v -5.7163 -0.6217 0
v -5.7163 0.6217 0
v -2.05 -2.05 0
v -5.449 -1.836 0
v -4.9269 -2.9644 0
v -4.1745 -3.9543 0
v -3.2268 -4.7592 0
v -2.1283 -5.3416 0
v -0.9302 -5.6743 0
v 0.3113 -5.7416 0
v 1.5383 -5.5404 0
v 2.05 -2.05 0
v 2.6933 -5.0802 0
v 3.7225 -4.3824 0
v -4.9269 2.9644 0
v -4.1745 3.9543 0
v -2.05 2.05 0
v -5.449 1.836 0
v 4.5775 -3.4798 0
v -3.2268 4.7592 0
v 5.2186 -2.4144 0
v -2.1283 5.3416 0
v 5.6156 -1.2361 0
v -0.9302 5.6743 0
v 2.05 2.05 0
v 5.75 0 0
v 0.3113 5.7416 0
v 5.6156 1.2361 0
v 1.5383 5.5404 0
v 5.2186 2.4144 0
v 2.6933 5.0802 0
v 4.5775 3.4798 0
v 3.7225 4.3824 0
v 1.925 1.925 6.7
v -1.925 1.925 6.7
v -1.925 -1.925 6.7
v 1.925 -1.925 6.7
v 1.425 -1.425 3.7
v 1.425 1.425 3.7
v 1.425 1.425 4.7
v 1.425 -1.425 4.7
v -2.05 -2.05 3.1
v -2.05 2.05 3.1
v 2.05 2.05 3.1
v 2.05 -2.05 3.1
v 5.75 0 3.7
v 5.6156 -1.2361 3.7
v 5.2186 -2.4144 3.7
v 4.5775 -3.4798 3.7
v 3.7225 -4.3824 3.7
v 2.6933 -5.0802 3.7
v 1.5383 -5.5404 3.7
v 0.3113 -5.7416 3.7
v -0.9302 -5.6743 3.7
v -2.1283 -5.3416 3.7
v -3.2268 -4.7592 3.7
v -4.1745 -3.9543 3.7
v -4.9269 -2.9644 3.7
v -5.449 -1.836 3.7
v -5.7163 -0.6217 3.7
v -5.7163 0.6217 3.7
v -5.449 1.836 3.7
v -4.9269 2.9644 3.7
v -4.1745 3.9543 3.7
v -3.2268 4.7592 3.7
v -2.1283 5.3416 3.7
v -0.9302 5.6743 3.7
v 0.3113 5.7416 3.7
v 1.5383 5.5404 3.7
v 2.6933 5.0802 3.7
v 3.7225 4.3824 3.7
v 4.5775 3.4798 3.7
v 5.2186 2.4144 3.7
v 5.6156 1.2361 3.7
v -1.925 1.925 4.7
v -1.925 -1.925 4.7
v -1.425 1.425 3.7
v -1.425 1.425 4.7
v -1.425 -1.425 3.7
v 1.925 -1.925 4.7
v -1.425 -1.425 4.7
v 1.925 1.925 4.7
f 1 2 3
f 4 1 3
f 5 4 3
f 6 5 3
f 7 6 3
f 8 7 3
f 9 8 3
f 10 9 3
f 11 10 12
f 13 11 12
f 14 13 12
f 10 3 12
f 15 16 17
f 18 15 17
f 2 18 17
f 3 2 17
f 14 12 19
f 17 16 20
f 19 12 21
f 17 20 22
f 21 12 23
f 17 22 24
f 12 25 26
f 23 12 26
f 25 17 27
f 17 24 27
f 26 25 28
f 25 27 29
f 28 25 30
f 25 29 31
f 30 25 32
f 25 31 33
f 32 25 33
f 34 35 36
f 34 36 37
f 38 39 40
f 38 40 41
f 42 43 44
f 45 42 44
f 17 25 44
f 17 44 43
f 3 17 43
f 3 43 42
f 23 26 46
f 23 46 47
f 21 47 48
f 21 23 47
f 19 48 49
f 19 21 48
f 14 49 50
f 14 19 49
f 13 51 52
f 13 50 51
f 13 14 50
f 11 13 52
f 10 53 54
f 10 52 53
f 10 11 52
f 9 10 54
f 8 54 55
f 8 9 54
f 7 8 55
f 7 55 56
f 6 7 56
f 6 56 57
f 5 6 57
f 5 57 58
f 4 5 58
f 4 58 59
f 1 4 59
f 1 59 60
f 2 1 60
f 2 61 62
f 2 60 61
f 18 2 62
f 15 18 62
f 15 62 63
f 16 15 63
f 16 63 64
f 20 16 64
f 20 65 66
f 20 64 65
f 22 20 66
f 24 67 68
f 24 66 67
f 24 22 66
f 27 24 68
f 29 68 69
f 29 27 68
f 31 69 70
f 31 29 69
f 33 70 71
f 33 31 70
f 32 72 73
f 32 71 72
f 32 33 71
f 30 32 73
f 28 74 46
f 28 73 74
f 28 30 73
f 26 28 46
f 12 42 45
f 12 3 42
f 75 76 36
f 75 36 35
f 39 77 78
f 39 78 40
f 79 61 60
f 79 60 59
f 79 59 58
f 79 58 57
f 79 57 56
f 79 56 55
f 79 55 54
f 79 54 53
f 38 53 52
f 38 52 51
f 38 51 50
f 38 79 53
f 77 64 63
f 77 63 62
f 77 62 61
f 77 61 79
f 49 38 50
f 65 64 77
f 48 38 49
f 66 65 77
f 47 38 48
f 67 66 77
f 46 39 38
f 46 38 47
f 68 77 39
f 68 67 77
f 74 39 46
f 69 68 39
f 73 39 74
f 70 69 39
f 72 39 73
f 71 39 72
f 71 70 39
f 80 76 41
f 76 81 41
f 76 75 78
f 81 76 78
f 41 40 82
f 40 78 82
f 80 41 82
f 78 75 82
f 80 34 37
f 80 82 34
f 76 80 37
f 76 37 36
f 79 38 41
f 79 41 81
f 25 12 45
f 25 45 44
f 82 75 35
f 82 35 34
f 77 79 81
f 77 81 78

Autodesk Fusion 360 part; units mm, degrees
sketch "Sketch1" plane through (0, 0, 0) normal (0, 0, 1) x (1, 0, 0)
  circle A0 centre (0, 0) radius 5.75
  line L0 (1.925, -1.925) -> (-1.925, -1.925)
  line L1 (-1.925, -1.925) -> (-1.925, 1.925)
  line L2 (-1.925, 1.925) -> (1.925, 1.925)
  line L3 (1.925, 1.925) -> (1.925, -1.925)
  line L4 (1.925, -1.925) -> (-1.925, 1.925) construction
  line L5 (-1.925, -1.925) -> (1.925, 1.925) construction
  line L6 (-1.425, 1.425) -> (1.425, 1.425)
  line L7 (1.425, 1.425) -> (1.425, -1.425)
  line L8 (1.425, -1.425) -> (-1.425, -1.425)
  line L9 (-1.425, -1.425) -> (-1.425, 1.425)
  line L10 (-2.05, -2.05) -> (2.05, -2.05)
  line L11 (2.05, -2.05) -> (2.05, 2.05)
  line L12 (2.05, 2.05) -> (-2.05, 2.05)
  line L13 (-2.05, 2.05) -> (-2.05, -2.05)
  line L14 (-2.05, -2.05) -> (2.05, 2.05) construction
  line L15 (2.05, -2.05) -> (-2.05, 2.05) construction
  dimension "d1" = 11.5
  dimension "d2" = 3.85
  dimension "d3" = 3.85
  dimension "d11" = 0.5
  dimension "d12" = 4.1
  dimension "d13" = 4.1
extrude "Extrude1" add sketch "Sketch1" along normal blind 3.7 contours A0 | L0 L1 L2 L3 | L6 L7 L8 L9 | L10 L11 L12 L13
extrude "Extrude2" cut sketch "Sketch1" along normal blind 3.1 contours L0 L1 L2 L3 | L6 L7 L8 L9 | L10 L11 L12 L13
extrude "Extrude3" add sketch "Sketch1" along normal blind 3 from surface at 3.7 contours L0 L1 L2 L3 | L6 L7 L8 L9
extrude "Extrude4" cut sketch "Sketch1" along normal blind 1 from surface at 3.7 contours L0 L1 L2 L3 | L10 L11 L12 L13
